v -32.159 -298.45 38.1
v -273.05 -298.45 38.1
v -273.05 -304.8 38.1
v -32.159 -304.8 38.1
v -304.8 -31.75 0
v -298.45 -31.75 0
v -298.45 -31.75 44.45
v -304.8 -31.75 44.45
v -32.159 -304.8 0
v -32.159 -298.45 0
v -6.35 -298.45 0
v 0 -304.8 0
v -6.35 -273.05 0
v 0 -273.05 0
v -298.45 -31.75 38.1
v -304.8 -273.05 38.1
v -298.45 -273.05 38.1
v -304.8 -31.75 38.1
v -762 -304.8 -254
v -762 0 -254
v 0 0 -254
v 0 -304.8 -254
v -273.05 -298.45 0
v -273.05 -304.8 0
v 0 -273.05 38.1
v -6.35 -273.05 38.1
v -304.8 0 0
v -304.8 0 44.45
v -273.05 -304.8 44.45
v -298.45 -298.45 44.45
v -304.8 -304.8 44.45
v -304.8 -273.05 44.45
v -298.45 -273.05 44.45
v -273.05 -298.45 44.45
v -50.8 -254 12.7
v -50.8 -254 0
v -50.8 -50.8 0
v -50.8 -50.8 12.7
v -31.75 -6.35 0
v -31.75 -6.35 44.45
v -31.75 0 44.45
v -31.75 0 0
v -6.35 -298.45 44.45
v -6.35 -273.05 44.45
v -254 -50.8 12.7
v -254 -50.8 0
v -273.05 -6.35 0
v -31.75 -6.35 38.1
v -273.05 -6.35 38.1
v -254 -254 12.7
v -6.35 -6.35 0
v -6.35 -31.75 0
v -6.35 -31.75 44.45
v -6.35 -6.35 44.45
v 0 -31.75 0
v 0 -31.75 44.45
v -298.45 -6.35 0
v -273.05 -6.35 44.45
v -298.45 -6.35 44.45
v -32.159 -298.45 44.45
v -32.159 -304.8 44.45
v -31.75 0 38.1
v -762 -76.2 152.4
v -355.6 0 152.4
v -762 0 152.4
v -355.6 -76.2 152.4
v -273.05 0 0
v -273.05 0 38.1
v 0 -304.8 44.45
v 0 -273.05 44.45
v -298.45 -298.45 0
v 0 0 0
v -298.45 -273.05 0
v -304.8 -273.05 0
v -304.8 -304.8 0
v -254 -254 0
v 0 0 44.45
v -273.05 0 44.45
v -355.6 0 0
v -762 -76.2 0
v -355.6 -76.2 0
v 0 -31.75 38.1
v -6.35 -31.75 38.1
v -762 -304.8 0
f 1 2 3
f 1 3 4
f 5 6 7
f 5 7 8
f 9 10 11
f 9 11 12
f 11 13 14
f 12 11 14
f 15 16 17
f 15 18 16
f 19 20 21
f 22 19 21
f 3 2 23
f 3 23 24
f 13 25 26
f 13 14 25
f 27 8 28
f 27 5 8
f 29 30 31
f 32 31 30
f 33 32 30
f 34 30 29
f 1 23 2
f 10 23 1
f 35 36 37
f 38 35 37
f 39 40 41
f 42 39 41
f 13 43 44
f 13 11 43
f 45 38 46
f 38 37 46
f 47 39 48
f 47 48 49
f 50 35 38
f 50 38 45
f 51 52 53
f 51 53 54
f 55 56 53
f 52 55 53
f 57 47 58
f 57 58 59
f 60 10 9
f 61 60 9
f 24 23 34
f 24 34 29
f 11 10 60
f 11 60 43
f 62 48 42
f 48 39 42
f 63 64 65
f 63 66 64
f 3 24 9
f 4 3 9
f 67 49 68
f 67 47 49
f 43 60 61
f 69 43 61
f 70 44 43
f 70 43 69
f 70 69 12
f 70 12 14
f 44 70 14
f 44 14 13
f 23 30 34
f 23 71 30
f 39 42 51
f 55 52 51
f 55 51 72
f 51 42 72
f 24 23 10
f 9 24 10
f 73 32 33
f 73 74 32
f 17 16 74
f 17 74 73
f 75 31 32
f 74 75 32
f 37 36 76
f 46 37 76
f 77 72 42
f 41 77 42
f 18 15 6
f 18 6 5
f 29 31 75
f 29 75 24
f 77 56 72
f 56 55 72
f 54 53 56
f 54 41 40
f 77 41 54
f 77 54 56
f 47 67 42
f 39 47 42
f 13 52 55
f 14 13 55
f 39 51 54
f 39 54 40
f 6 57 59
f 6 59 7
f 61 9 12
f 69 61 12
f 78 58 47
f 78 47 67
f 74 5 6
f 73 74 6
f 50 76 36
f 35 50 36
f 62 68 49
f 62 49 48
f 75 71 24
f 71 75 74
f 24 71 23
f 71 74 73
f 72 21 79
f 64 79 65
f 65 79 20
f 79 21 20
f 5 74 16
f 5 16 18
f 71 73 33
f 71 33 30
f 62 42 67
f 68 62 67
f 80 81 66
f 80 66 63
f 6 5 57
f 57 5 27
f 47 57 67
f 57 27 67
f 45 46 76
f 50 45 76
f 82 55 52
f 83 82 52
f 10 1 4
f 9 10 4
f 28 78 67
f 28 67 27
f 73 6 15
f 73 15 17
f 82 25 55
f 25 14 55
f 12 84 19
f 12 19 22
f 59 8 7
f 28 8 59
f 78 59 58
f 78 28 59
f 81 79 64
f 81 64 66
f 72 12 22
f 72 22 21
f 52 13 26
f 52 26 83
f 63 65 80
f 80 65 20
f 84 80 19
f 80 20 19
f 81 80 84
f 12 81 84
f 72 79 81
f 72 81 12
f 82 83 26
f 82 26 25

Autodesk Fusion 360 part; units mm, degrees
sketch "Sketch1" plane through (0, 0, 0) normal (0, 0, 1) x (1, 0, 0)
  line L0 (0, 0) -> (-762, 0)
  line L1 (-762, 0) -> (-762, -304.8)
  line L2 (-762, -304.8) -> (0, -304.8)
  line L3 (0, -304.8) -> (0, 0)
  line L4 (0, -304.8) -> (-304.8, -304.8)
  line L5 (-304.8, -304.8) -> (-304.8, 0)
  line L6 (-304.8, 0) -> (0, 0)
  line L7 (0, 0) -> (0, -304.8)
  line L8 (-6.35, -6.35) -> (-298.45, -6.35)
  line L9 (-298.45, -6.35) -> (-298.45, -298.45)
  line L10 (-298.45, -298.45) -> (-6.35, -298.45)
  line L11 (-6.35, -298.45) -> (-6.35, -6.35)
  line L12 (-304.8, -6.35) -> (-304.8, 0)
  line L13 (-304.8, 0) -> (-298.45, 0)
  line L14 (0, -6.35) -> (0, 0)
  line L15 (0, 0) -> (-6.35, 0)
  line L16 (-6.35, -6.35) -> (-31.75, -6.35)
  line L17 (-31.75, -6.35) -> (-31.75, 0)
  line L18 (-31.75, 0) -> (-6.35, 0)
  line L19 (0, -6.35) -> (0, -31.75)
  line L20 (0, -31.75) -> (-6.35, -31.75)
  line L21 (-6.35, -31.75) -> (-6.35, -6.35)
  line L22 (-298.45, -6.35) -> (-298.45, -31.75)
  line L23 (-298.45, -31.75) -> (-304.8, -31.75)
  line L24 (-304.8, -31.75) -> (-304.8, -6.35)
  line L25 (-298.45, -6.35) -> (-273.05, -6.35)
  line L26 (-273.05, -6.35) -> (-273.05, 0)
  line L27 (-273.05, 0) -> (-298.45, 0)
  line L28 (-298.45, -298.45) -> (-273.05, -298.45)
  line L29 (-273.05, -298.45) -> (-273.05, -304.8)
  line L30 (-273.05, -304.8) -> (-298.45, -304.8)
  line L31 (-304.8, -298.45) -> (-304.8, -273.05)
  line L32 (-304.8, -273.05) -> (-298.45, -273.05)
  line L33 (-298.45, -273.05) -> (-298.45, -298.45)
  line L34 (0, -298.45) -> (0, -273.05)
  line L35 (0, -273.05) -> (-6.35, -273.05)
  line L36 (-6.35, -273.05) -> (-6.35, -298.45)
  line L37 (-6.7592, -298.45) -> (-32.1592, -298.45)
  line L38 (-32.1592, -298.45) -> (-32.1592, -304.8)
  line L39 (-32.1592, -304.8) -> (-6.7592, -304.8)
  point P0 (-152.4, -152.4)
  dimension "d1" = 762
  dimension "d2" = 304.8
  dimension "d3" = 304.8
  dimension "d4" = 292.1
  dimension "d5" = 292.1
  dimension "d6" = 25.4
  dimension "d7" = 25.4
  dimension "d8" = 25.4
  dimension "d9" = 25.4
  dimension "d10" = 25.4
  dimension "d11" = 25.4
  dimension "d12" = 25.4
  dimension "d13" = 25.4
extrude "Extrude1" add sketch "Sketch1" against normal blind 254 makes body 1
extrude "Extrude1'" add sketch "Sketch1" along normal blind 38.1 separate body contours L0 L6 L8 L17 L26 | L3 L7 L11 L20 L35 | L5 L9 L23 L32 | L2 L4 L10 L29 L38 makes body 2 at (0, -192.6167, 12.7) makes body 3 at (-304.8, -192.6167, 12.7) makes body 4 at (-112.1833, -6.35, 12.7) makes body 5 at (-192.7531, -304.8, 12.7) in component "Water Bath Glass"
copy_body "Body->Comp1" bodies 1 removing the originals makes body 6 in component "Component"
extrude "Extrude1''" add sketch "Sketch1" along normal blind 44.45 separate body contours L0 L3 L6 L7 L8 L11 L14 L15 L16 L17 L18 L19 L20 L21 | L0 L5 L6 L8 L9 L12 L13 L22 L23 L24 L25 L26 L27 | L2 L3 L4 L7 L10 L11 L34 L35 L36 L37 L38 L39 | L2 L4 L5 L9 L10 L28 L29 L30 L31 L32 L33 makes body 7 at (-283.6333, 0, 29.6333) makes body 8 at (-21.4395, -304.8, 14.8167) makes body 9 at (-21.1667, 0, 14.8167) makes body 10 at (-294.2167, -304.8, 29.6333) in component "Component'"
sketch "Sketch2" plane through (0, 0, 0) normal (0, 0, 1) x (-1, 0, 0)
  line L0 (762, 304.8) -> (0, 304.8)
  line L1 (0, 304.8) -> (0, 0)
  line L2 (0, 0) -> (762, 0)
  line L3 (762, 0) -> (762, 304.8)
  line L4 (298.45, 6.35) -> (273.05, 6.35)
  line L5 (273.05, 6.35) -> (273.05, 0)
  line L6 (273.05, 0) -> (304.8, 0)
  line L7 (304.8, 0) -> (304.8, 31.75)
  line L8 (304.8, 31.75) -> (298.45, 31.75)
  line L9 (298.45, 31.75) -> (298.45, 6.35)
  line L10 (298.45, 31.75) -> (304.8, 31.75)
  line L11 (304.8, 31.75) -> (304.8, 273.05)
  line L12 (304.8, 273.05) -> (298.45, 273.05)
  line L13 (298.45, 273.05) -> (298.45, 31.75)
  line L14 (298.45, 273.05) -> (304.8, 273.05)
  line L15 (304.8, 273.05) -> (304.8, 304.8)
  line L16 (304.8, 304.8) -> (273.05, 304.8)
  line L17 (273.05, 304.8) -> (273.05, 298.45)
  line L18 (273.05, 298.45) -> (298.45, 298.45)
  line L19 (298.45, 298.45) -> (298.45, 273.05)
  line L20 (762, 0) -> (355.6, 0)
  line L21 (355.6, 0) -> (355.6, 76.2)
  line L22 (355.6, 76.2) -> (762, 76.2)
  line L23 (762, 76.2) -> (762, 0)
  dimension "d20" = 406.4
  dimension "d21" = 76.2
extrude "Extrude1'''" add sketch "Sketch2" along normal blind 152.4 contours L2 L3 L20 L21 L22 L23 bodies 6 in component "Component"
sketch "Sketch3" plane through (0, 0, 0) normal (0, 0, 1) x (-1, 0, 0)
  line L0 (355.6, 0) -> (355.6, 76.2)
  line L1 (355.6, 76.2) -> (762, 76.2)
  line L2 (762, 76.2) -> (762, 304.8)
  line L3 (762, 304.8) -> (0, 304.8)
  line L4 (0, 304.8) -> (0, 0)
  line L5 (0, 0) -> (355.6, 0)
  line L6 (31.75, 6.35) -> (31.75, 0)
  line L7 (31.75, 0) -> (273.05, 0)
  line L8 (273.05, 0) -> (273.05, 6.35)
  line L9 (273.05, 6.35) -> (31.75, 6.35)
  line L10 (273.05, 298.45) -> (273.05, 304.8)
  line L11 (273.05, 304.8) -> (32.1592, 304.8)
  line L12 (32.1592, 304.8) -> (32.1592, 298.45)
  line L13 (32.1592, 298.45) -> (273.05, 298.45)
  line L14 (0, 31.75) -> (6.35, 31.75)
  line L15 (6.35, 31.75) -> (6.35, 273.05)
  line L16 (6.35, 273.05) -> (0, 273.05)
  line L17 (0, 273.05) -> (0, 31.75)
  line L18 (298.45, 31.75) -> (304.8, 31.75)
  line L19 (304.8, 31.75) -> (304.8, 273.05)
  line L20 (304.8, 273.05) -> (298.45, 273.05)
  line L21 (298.45, 273.05) -> (298.45, 31.75)
  line L22 (762, 76.2) -> (355.6, 76.2)
  line L23 (355.6, 76.2) -> (355.6, 0)
  line L24 (355.6, 0) -> (762, 0)
  line L25 (762, 0) -> (762, 76.2)
  line L26 (50.8, 50.8) -> (254, 50.8)
  line L27 (254, 50.8) -> (254, 254)
  line L28 (254, 254) -> (50.8, 254)
  line L29 (50.8, 254) -> (50.8, 50.8)
  line L30 (50.8, 50.8) -> (254, 254) construction
  line L31 (254, 50.8) -> (50.8, 254) construction
  point P0 (152.4, 152.4)
  dimension "d24" = 203.2
  dimension "d25" = 203.2
extrude "Extrude1''''" add sketch "Sketch3" along normal blind 12.7 separate body contours L26 L27 L28 L29 makes body 11 in component "Component''"
component "Water Bath Glass" placed x (1, 0, 0) y (0, 1, 0) z (0, 0, 1) at (0, 0, 0)
component "Component" placed x (1, 0, 0) y (0, 1, 0) z (0, 0, 1) at (0, 0, 0)
component "Component'" placed x (1, 0, 0) y (0, 1, 0) z (0, 0, 1) at (0, 0, 0)
component "Component''" placed x (1, 0, 0) y (0, 1, 0) z (0, 0, 1) at (0, 0, 0)
